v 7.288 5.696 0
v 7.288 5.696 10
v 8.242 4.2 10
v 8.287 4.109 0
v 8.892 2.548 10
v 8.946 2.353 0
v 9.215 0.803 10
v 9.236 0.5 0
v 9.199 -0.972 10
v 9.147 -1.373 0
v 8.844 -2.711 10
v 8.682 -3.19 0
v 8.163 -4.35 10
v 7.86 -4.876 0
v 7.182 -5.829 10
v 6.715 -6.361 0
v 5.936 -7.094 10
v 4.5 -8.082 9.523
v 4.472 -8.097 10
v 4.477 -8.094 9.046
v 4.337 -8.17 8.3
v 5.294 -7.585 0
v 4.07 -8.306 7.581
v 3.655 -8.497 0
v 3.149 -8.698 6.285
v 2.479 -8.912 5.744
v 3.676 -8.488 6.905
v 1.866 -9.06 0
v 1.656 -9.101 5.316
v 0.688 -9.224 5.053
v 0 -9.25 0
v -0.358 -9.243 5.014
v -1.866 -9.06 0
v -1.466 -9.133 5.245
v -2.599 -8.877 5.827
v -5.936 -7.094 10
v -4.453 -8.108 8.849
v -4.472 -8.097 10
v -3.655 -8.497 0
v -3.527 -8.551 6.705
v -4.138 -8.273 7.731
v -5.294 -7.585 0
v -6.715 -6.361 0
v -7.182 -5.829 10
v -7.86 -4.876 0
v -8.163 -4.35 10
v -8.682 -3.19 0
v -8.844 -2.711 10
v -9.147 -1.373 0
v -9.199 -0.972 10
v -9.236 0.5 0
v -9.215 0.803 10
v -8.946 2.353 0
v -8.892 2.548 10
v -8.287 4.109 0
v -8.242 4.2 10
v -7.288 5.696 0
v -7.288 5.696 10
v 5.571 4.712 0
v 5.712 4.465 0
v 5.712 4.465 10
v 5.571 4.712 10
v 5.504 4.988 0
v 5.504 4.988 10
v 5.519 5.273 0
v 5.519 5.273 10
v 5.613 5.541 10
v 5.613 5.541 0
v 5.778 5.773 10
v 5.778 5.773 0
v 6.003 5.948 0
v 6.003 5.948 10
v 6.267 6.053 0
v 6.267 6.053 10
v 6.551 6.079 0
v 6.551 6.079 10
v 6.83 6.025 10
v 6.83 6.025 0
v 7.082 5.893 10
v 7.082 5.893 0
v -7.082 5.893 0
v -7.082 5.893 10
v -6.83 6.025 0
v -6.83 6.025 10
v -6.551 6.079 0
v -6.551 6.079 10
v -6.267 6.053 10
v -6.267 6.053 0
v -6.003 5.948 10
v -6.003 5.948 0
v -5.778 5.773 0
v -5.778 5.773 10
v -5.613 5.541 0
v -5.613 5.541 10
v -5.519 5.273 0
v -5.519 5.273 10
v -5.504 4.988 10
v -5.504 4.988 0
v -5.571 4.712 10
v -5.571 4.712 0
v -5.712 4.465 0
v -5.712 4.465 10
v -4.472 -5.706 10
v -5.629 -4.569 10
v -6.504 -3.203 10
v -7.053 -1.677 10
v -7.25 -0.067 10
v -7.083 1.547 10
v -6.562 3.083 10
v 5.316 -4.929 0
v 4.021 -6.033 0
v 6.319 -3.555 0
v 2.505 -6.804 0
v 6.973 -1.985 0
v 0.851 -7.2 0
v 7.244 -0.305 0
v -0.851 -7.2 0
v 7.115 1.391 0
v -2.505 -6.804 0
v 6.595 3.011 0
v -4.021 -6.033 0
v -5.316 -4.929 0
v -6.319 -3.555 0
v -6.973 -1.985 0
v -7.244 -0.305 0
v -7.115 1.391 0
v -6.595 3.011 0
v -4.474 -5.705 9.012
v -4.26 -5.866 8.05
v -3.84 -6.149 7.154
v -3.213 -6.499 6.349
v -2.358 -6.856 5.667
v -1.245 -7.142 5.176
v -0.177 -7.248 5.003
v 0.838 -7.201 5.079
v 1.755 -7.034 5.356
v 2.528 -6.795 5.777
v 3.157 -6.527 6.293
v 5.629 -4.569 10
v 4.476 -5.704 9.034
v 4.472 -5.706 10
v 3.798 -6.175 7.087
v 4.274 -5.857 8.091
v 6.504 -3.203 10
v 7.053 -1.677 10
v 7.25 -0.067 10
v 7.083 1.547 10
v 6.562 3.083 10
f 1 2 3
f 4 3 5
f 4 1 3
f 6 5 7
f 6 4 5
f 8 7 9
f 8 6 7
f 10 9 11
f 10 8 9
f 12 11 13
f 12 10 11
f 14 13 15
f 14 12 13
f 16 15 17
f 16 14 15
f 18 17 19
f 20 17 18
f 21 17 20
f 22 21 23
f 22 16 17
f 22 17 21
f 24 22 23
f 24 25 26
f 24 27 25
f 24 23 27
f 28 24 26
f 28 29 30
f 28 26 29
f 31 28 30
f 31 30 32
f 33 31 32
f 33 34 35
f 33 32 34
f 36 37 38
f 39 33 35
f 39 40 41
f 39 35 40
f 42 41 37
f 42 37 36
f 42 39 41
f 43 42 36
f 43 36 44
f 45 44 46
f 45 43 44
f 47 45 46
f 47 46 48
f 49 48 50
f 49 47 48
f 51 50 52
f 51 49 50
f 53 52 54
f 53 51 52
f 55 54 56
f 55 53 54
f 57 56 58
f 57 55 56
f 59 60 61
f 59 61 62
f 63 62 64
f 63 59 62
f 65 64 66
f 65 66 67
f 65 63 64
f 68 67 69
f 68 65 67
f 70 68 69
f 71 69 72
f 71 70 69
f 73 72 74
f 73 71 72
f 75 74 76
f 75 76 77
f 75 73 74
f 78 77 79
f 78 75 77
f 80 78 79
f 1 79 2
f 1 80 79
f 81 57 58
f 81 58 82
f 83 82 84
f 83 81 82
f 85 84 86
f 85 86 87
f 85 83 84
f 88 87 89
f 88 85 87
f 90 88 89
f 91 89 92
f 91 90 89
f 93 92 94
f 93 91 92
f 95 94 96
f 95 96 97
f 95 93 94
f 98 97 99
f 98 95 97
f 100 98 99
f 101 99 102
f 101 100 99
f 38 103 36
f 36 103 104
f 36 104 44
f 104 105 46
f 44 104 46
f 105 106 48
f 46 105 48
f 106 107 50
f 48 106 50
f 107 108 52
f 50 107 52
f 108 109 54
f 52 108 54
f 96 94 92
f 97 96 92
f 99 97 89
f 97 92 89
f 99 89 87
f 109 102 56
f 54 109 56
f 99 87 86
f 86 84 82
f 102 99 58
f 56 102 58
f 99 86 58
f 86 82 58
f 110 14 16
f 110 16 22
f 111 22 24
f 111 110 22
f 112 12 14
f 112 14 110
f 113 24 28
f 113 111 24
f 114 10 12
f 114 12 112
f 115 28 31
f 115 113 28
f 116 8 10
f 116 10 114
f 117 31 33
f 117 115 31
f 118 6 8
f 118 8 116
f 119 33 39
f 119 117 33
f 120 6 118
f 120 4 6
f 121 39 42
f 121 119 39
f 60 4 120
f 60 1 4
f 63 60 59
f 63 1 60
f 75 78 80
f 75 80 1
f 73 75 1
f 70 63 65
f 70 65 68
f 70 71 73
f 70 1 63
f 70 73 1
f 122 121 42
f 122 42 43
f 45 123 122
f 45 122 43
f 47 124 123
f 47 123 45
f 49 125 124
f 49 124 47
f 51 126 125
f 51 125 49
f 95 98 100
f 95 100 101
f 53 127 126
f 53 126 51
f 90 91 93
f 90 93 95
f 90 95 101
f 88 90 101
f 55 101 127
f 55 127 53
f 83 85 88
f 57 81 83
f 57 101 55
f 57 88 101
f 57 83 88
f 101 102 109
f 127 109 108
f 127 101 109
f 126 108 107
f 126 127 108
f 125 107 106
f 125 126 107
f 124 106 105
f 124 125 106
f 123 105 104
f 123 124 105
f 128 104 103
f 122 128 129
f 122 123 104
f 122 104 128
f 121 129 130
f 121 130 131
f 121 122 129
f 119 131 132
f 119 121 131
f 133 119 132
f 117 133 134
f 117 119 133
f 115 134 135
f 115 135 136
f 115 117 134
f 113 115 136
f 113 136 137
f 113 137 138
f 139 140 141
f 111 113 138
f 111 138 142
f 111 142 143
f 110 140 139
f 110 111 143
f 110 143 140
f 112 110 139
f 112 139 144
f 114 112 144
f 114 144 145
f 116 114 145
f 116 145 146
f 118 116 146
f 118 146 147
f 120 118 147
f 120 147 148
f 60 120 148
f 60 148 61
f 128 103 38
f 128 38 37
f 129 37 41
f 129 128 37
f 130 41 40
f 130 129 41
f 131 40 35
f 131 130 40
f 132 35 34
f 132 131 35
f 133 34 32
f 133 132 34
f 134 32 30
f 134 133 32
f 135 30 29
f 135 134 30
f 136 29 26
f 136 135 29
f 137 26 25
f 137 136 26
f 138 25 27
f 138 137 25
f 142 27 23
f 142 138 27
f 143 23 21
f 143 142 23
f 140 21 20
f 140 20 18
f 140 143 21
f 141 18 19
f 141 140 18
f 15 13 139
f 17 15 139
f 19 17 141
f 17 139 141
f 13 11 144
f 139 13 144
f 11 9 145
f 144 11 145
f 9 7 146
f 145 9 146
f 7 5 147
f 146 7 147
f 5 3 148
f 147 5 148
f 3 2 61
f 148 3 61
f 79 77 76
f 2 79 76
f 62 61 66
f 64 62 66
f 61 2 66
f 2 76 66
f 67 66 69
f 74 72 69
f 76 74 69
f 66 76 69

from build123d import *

# Parameters (mm, degrees)
EXTRUDE_569_DEPTH           = 10
CUT_EXTRUDE_2098_DEPTH      = 21.508286309
CUT_EXTRUDE_2098_DEPTH_BACK = 21.508286309
SKETCH_6_R                  = 4.5


with BuildPart() as part:
    # Эскиз1 → Extrude 569 (new body)
    with BuildSketch(Plane.XY):
        with BuildLine():
            ThreePointArc((-5.712121212, 4.464770012), (0, -7.25), (5.712121212, 4.464770012))
            ThreePointArc((5.712121212, 4.464770012), (5.884169654, 5.868479146), (7.287878788, 5.696430705))
            ThreePointArc((7.287878788, 5.696430705), (0, -9.25), (-7.287878788, 5.696430705))
            ThreePointArc((-7.287878788, 5.696430705), (-5.884169654, 5.868479146), (-5.712121212, 4.464770012))
        make_face()
    extrude(amount=EXTRUDE_569_DEPTH)

    # Эскиз6 → Cut-Extrude 2098 (cut, two sides: drawn at the far end of the back side and taken through both)
    with BuildSketch(Plane(origin=(0, -9.25, 0), x_dir=(-1, 0, 0), z_dir=(0, -1, 0)).offset(-CUT_EXTRUDE_2098_DEPTH_BACK)):
        with Locations((0, -9.5)):
            Circle(SKETCH_6_R)
    extrude(amount=CUT_EXTRUDE_2098_DEPTH + CUT_EXTRUDE_2098_DEPTH_BACK, mode=Mode.SUBTRACT)


solid = part.part
